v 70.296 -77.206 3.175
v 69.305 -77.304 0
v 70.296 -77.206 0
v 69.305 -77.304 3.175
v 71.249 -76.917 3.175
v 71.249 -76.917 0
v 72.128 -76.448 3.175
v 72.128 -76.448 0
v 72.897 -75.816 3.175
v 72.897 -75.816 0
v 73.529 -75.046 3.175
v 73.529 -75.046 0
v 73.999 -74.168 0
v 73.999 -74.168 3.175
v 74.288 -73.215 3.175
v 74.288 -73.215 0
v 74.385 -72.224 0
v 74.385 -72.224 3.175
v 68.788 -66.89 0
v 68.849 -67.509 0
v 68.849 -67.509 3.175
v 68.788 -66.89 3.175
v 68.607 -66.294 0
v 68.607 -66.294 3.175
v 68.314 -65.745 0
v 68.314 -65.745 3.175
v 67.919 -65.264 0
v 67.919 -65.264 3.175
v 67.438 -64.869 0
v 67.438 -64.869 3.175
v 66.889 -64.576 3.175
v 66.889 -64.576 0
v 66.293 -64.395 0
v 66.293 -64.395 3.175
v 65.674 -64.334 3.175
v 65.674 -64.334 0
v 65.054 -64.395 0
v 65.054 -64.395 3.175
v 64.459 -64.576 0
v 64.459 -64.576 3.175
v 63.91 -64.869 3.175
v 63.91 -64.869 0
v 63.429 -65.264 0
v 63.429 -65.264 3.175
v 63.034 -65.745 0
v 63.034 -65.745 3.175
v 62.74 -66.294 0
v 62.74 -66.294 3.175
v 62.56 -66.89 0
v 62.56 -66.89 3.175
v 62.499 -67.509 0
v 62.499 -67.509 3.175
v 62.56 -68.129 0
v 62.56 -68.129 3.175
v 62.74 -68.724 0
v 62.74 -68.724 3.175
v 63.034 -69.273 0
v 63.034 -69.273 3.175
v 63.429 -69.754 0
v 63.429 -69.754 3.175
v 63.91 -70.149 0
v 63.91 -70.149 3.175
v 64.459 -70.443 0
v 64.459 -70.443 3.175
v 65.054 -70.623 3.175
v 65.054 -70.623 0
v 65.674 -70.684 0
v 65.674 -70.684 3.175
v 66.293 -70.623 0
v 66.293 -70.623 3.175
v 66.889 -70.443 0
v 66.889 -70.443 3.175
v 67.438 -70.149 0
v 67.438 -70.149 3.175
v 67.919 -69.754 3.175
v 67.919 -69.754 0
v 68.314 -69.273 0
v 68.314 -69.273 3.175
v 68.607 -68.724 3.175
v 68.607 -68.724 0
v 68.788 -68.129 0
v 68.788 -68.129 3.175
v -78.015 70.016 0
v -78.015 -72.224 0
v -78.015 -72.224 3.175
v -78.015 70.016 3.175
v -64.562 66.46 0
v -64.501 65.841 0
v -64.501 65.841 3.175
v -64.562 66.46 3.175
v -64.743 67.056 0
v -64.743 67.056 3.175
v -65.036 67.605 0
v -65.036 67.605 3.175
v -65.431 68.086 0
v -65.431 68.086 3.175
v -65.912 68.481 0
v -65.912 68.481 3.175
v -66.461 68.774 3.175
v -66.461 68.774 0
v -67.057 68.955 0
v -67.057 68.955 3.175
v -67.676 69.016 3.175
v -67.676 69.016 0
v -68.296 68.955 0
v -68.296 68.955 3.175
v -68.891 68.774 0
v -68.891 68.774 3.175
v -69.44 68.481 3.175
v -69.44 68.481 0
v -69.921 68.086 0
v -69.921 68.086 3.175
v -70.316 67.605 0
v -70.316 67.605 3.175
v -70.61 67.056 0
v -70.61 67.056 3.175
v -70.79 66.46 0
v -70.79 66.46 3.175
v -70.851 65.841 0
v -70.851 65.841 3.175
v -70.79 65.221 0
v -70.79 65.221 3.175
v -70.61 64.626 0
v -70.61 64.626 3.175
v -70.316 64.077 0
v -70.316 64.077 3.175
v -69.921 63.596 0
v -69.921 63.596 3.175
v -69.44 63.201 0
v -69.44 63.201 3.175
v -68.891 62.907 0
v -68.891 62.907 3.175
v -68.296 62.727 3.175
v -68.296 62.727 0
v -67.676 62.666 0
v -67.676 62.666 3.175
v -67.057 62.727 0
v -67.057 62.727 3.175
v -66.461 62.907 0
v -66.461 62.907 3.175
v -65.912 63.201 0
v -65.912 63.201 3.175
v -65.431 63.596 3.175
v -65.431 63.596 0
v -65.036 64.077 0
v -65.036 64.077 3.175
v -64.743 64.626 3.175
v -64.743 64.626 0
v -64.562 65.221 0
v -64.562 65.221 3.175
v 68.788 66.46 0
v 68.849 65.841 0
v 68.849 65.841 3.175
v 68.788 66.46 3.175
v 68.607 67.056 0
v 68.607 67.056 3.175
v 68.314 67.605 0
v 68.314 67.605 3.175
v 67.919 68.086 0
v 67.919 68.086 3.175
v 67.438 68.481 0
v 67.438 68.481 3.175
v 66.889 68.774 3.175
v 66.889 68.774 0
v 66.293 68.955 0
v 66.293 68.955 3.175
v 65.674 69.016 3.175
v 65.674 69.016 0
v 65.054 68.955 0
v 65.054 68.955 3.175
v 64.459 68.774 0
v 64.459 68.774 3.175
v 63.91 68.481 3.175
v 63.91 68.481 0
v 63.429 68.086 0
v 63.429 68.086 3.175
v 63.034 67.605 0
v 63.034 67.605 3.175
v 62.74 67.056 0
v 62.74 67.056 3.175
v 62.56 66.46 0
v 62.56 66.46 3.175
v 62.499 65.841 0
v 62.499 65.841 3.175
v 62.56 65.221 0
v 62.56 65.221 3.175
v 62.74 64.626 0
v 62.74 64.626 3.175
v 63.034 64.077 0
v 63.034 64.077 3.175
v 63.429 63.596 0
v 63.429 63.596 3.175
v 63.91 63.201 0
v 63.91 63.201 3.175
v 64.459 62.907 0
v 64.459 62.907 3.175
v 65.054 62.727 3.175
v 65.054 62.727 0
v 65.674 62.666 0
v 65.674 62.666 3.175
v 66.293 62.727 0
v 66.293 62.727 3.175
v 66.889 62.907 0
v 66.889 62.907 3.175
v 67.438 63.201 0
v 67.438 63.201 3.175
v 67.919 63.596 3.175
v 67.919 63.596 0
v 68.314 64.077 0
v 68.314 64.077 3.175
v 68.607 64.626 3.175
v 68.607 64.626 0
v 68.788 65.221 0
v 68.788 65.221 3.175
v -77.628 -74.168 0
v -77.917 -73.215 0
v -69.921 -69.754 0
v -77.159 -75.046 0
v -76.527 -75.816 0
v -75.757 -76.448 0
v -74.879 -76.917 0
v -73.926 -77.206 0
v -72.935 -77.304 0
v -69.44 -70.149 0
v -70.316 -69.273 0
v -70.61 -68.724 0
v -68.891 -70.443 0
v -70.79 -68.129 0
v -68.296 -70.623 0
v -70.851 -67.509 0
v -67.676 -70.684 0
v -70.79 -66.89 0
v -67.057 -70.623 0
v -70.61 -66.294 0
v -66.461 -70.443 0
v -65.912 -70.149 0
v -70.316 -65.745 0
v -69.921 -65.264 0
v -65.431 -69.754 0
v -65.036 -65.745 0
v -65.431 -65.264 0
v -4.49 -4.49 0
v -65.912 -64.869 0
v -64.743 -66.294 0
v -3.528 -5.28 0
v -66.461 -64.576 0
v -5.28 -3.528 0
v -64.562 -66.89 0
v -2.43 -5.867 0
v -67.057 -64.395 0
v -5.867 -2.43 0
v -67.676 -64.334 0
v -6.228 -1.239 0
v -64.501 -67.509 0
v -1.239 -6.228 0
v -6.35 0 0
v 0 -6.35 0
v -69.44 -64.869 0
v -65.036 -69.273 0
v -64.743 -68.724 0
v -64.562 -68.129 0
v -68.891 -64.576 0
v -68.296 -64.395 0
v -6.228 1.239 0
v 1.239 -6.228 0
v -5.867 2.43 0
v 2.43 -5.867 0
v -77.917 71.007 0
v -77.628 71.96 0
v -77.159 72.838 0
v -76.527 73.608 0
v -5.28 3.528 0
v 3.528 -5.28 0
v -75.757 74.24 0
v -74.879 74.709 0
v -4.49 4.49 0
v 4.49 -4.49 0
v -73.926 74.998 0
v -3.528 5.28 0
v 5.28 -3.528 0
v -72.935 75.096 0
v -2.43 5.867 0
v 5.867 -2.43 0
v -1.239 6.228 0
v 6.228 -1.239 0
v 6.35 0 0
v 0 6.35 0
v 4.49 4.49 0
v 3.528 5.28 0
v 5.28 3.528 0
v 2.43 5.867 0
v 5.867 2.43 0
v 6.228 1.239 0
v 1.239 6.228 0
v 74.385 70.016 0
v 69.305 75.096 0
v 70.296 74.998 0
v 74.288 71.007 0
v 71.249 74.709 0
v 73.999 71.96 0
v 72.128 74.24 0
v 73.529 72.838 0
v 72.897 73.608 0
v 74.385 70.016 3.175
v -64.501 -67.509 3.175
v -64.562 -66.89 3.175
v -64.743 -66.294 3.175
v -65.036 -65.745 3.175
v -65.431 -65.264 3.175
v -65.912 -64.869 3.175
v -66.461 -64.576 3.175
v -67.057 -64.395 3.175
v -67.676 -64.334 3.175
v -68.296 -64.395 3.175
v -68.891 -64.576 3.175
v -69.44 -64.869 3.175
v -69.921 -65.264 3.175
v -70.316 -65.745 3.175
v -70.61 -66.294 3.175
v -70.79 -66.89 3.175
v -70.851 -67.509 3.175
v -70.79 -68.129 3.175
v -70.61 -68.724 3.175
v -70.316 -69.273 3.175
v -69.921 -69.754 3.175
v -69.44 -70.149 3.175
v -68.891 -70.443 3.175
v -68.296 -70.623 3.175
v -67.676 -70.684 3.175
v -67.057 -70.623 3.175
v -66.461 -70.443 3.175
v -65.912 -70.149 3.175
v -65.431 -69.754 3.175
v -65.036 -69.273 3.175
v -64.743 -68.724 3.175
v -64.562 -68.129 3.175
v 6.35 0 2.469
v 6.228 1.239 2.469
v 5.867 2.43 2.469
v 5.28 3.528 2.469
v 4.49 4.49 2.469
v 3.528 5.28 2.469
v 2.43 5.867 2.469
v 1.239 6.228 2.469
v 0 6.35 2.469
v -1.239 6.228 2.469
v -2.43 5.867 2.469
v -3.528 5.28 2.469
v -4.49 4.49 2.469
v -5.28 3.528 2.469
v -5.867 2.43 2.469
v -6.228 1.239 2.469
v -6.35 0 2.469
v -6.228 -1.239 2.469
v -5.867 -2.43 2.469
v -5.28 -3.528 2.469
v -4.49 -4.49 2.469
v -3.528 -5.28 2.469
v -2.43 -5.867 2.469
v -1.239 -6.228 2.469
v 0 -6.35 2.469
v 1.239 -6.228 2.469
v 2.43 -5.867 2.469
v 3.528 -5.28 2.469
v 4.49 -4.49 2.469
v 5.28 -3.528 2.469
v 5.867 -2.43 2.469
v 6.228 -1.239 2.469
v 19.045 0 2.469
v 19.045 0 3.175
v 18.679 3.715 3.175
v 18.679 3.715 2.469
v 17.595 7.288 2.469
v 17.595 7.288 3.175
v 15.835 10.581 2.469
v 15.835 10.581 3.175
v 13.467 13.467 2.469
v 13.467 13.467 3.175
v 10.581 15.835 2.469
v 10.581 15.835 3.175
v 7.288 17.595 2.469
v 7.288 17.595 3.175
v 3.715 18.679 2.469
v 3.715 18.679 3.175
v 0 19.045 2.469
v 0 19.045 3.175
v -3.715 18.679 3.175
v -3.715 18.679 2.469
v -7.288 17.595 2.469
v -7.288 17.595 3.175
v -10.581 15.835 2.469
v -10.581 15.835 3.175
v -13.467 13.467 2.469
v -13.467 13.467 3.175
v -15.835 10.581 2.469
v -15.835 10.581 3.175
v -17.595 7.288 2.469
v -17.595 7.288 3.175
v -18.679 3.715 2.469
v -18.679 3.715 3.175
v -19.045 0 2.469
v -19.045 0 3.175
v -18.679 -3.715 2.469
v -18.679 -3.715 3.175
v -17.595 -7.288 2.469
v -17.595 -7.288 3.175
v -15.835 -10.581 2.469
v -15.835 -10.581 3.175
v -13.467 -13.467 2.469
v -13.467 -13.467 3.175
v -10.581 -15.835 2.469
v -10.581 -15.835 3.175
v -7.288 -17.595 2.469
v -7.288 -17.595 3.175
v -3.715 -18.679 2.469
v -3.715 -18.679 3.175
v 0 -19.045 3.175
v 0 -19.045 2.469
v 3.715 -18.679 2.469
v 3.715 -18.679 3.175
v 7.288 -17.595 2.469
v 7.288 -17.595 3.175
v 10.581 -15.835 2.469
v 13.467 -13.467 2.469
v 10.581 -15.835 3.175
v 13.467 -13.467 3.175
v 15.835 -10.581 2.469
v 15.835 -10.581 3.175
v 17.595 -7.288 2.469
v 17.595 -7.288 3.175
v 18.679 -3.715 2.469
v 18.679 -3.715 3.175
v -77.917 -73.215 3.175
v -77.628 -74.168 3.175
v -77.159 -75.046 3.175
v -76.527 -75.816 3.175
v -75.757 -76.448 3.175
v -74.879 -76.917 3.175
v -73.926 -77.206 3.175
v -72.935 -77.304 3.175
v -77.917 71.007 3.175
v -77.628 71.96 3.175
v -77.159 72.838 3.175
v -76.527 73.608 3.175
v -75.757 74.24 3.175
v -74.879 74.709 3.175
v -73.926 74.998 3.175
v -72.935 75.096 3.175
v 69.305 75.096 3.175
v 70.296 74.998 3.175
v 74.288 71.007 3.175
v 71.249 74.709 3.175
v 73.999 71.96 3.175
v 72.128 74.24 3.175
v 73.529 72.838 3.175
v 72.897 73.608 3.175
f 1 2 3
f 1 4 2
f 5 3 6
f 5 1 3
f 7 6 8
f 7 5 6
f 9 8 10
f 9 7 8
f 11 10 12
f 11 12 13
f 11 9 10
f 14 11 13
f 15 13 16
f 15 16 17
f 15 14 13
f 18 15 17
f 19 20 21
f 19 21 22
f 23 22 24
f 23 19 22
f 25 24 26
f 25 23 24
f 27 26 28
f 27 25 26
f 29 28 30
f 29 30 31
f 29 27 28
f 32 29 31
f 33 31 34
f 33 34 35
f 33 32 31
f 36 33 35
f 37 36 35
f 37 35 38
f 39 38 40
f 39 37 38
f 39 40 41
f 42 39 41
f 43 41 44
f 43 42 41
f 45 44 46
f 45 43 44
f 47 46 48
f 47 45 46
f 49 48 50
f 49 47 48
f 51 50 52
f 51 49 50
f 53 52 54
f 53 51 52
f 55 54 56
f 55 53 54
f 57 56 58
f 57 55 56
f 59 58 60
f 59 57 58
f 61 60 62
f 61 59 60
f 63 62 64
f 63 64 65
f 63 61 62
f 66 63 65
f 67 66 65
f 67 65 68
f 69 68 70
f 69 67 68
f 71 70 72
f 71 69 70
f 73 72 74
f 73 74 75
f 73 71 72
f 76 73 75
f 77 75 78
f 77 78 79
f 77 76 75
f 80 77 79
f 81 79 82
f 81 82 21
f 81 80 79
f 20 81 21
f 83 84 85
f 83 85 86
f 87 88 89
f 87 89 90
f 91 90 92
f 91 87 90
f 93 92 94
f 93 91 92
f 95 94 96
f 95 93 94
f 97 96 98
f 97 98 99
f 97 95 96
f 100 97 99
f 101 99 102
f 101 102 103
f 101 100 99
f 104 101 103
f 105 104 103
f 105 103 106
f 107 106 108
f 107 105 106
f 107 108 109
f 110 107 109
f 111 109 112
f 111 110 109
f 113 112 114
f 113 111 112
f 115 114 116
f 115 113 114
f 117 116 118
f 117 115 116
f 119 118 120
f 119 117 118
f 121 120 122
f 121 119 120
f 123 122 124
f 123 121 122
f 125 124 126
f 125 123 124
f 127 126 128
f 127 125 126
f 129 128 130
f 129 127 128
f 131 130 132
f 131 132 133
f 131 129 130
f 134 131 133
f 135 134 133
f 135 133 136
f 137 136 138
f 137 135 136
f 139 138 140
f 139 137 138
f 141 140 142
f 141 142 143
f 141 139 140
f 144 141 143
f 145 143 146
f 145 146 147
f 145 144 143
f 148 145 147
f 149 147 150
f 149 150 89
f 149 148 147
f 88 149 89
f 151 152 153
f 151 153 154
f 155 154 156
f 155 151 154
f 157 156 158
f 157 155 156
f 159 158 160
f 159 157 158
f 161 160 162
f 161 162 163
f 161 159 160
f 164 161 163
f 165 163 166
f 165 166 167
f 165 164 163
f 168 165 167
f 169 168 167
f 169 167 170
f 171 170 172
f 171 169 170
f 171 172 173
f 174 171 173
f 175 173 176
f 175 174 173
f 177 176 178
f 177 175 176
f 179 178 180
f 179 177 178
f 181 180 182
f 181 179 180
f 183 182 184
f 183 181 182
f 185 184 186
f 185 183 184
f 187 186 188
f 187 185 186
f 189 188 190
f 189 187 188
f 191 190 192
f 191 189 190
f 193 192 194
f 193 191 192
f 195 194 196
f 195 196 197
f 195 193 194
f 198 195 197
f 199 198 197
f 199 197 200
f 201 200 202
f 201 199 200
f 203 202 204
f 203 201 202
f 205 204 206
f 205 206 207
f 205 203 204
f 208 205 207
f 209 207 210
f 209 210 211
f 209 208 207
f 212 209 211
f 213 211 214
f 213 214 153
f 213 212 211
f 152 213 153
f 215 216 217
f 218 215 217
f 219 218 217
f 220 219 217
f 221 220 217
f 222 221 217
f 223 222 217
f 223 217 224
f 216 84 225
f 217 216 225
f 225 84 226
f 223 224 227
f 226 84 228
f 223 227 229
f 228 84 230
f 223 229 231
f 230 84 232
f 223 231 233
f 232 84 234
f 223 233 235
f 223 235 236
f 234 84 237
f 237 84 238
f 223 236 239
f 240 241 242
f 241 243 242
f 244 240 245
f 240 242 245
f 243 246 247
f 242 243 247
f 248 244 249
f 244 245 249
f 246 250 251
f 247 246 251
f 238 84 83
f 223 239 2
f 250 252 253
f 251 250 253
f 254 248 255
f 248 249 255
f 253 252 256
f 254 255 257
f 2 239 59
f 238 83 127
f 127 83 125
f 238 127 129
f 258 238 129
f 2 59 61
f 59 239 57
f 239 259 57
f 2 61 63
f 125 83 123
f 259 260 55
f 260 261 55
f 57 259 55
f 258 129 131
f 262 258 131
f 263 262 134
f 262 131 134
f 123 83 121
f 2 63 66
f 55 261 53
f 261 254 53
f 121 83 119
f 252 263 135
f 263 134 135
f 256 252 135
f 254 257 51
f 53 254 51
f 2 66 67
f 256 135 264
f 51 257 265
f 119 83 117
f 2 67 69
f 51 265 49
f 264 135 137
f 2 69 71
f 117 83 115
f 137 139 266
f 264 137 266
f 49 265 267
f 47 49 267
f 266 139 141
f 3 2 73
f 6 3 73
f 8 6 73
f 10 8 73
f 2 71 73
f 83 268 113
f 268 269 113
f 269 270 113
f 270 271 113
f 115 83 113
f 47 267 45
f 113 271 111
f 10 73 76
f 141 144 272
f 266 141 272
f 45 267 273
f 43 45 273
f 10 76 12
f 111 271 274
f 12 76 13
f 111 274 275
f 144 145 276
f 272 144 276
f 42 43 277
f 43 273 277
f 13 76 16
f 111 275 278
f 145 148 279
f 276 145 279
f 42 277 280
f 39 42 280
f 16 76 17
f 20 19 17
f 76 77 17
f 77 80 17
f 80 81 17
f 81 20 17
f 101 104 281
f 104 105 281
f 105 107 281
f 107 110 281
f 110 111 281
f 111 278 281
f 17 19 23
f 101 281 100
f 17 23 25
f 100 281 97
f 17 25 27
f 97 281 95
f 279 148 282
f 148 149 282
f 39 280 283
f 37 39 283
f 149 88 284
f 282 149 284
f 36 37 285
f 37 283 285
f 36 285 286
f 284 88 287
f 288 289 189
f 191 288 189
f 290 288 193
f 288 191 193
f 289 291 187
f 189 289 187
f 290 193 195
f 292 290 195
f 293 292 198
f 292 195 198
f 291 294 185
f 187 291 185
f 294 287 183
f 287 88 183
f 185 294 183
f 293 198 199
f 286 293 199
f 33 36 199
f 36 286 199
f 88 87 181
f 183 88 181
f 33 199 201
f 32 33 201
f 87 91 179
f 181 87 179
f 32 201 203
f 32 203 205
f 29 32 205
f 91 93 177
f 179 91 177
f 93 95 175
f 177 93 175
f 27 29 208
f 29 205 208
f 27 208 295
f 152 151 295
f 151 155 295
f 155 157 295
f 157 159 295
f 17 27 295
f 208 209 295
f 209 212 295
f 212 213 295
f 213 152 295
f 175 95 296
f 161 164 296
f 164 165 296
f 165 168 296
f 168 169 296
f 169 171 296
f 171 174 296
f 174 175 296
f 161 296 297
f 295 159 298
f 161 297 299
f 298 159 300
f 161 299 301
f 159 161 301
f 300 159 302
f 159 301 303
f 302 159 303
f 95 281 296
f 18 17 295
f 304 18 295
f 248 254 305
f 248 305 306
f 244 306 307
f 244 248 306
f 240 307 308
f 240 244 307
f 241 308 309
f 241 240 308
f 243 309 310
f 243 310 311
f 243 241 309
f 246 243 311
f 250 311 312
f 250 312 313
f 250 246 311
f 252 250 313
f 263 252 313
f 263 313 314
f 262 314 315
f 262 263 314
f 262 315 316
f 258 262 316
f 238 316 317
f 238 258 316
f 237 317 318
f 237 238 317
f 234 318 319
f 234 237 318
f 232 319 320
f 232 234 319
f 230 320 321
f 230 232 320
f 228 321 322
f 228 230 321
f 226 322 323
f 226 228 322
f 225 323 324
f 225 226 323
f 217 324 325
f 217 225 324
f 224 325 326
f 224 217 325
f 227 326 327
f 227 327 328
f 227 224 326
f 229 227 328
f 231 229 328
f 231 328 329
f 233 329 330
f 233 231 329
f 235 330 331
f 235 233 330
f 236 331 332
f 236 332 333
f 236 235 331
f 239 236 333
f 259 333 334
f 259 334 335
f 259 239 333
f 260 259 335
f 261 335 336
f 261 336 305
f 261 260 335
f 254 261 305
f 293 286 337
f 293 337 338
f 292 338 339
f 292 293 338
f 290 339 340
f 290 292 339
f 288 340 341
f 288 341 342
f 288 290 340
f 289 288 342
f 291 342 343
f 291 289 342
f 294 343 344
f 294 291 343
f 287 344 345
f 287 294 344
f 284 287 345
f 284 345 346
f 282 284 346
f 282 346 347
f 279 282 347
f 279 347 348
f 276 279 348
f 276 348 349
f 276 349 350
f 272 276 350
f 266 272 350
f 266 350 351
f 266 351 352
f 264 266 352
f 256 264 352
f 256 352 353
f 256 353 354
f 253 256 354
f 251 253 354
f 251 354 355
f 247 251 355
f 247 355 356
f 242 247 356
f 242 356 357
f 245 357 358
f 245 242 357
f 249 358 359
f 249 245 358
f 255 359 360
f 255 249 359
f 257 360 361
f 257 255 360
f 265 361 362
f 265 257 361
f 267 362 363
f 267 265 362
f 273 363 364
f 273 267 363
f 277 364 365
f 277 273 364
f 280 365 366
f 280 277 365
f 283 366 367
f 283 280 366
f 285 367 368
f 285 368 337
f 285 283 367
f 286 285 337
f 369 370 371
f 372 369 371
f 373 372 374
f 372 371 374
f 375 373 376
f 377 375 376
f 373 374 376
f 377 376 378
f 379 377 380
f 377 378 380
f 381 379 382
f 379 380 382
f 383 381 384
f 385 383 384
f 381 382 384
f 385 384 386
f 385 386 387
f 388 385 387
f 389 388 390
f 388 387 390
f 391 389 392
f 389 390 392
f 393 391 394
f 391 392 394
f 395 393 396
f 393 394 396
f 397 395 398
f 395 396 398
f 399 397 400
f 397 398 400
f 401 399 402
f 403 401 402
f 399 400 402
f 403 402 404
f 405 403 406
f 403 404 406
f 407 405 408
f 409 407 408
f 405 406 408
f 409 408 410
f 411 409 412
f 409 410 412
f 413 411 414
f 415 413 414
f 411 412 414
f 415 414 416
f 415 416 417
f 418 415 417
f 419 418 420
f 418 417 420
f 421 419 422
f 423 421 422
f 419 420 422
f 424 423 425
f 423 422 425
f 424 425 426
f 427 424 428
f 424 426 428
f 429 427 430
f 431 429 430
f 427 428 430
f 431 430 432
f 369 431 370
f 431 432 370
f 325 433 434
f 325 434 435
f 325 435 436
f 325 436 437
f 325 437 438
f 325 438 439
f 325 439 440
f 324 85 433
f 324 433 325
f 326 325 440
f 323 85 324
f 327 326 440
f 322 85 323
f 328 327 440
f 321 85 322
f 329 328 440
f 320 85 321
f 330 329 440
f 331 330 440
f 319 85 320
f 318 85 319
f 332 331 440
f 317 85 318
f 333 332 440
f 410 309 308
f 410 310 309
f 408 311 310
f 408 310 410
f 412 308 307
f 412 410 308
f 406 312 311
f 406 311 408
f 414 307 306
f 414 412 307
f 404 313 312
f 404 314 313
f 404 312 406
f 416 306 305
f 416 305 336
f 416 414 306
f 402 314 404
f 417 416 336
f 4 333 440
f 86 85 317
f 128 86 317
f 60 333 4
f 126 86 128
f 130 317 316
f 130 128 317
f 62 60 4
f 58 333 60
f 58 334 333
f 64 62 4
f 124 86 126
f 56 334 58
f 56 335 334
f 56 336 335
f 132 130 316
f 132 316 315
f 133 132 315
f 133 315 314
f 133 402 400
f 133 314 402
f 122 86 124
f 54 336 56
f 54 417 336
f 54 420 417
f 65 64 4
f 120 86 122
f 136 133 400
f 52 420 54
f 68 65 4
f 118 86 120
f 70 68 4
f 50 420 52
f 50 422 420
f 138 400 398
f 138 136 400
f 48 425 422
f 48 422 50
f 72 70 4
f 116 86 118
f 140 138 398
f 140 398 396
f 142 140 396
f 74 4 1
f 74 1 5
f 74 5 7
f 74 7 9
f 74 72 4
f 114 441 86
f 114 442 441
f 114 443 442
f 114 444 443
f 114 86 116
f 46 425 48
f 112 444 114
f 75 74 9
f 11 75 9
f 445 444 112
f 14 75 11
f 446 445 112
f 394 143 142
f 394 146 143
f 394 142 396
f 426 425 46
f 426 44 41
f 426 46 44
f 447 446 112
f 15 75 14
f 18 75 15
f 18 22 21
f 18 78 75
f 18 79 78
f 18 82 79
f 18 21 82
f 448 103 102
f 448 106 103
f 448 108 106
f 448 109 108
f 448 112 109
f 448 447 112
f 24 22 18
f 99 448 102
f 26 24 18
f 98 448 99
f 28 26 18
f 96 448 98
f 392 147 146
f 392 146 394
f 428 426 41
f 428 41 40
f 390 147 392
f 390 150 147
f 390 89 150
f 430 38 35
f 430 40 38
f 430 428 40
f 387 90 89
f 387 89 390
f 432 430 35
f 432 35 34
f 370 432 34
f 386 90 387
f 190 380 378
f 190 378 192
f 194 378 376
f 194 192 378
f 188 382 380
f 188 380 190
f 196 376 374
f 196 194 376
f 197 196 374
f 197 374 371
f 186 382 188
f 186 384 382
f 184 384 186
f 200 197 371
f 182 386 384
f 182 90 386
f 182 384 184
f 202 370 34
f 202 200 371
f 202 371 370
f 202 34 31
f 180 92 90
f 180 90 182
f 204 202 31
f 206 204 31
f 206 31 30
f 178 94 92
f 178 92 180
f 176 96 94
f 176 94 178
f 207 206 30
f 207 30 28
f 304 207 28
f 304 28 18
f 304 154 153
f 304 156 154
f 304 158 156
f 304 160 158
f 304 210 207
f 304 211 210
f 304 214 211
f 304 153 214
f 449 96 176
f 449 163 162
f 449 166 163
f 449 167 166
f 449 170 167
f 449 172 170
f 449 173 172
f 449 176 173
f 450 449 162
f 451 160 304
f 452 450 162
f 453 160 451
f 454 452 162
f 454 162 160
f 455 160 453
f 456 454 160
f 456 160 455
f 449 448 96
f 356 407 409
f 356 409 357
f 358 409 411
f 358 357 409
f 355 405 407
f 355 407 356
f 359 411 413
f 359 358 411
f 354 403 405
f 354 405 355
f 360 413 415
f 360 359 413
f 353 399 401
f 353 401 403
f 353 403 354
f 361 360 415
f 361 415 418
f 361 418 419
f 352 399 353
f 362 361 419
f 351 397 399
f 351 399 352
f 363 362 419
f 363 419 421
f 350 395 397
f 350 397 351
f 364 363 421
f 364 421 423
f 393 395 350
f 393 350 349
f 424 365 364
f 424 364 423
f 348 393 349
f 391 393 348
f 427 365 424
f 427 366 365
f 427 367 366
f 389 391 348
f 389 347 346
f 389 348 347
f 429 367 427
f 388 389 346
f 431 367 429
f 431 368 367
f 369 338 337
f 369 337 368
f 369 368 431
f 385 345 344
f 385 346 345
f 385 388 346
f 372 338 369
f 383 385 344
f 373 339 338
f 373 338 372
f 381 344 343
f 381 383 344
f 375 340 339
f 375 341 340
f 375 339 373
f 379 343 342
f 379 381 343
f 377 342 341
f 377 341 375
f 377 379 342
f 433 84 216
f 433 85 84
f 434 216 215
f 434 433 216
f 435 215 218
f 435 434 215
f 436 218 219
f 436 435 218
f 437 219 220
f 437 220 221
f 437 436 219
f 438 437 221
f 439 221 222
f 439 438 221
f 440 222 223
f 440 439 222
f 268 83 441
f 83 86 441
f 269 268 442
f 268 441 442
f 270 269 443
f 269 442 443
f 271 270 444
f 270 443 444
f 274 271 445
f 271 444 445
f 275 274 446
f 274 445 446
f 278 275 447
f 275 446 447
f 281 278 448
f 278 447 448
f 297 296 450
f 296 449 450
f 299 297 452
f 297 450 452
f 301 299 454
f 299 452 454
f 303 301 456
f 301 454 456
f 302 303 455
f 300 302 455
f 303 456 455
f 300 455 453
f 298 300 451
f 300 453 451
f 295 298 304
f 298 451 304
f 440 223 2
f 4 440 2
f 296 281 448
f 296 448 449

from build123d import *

# Parameters (mm, degrees)
F0_W     = 152.4
F0_H     = 152.4
F0_R     = 3.175
F0_R_2   = 6.35
F1_DEPTH = 3.175
F2_R     = 5.08
F3_R     = 19.044803008
F3_R_2   = 6.35
F4_DEPTH = 0.7055555556


# Not quite as in the source:
# - a length typed as a fraction of an inch, garbled in the dataset ("3 / 203.2 mm" for 3/8 in), is restored


with BuildPart() as f1:
    # F0 (on Top) → F1 (new body)
    with BuildSketch(Plane.XY):
        with Locations((-1.8146978691, -1.1040684107)):
            Rectangle(F0_W, F0_H)
        with Locations((-67.6762834191, -67.5093614922)):
            Circle(F0_R, mode=Mode.SUBTRACT)
        with Locations((65.6737165809, -67.5093614922)):
            Circle(F0_R, mode=Mode.SUBTRACT)
        with Locations((-67.6762834191, 65.8406385078)):
            Circle(F0_R, mode=Mode.SUBTRACT)
        Circle(F0_R_2, mode=Mode.SUBTRACT)
        with Locations((65.6737165809, 65.8406385078)):
            Circle(F0_R, mode=Mode.SUBTRACT)
    extrude(amount=F1_DEPTH)

    # F2
    f2_edges = [f1.edges().sort_by_distance(p)[0] for p in [
        (74.385302, 75.095932, 1.5875),
        (-78.014698, 75.095932, 1.5875),
        (74.385302, -77.304068, 1.5875),
        (-78.014698, -77.304068, 1.5875),
    ]]
    fillet(f2_edges, radius=F2_R)

    # F3 (on face) → F4 (cut)
    with BuildSketch(Plane.XY.offset(3.175)):
        Circle(F3_R)
        Circle(F3_R_2, mode=Mode.SUBTRACT)
    extrude(amount=-F4_DEPTH, mode=Mode.SUBTRACT)


solid = f1.part
